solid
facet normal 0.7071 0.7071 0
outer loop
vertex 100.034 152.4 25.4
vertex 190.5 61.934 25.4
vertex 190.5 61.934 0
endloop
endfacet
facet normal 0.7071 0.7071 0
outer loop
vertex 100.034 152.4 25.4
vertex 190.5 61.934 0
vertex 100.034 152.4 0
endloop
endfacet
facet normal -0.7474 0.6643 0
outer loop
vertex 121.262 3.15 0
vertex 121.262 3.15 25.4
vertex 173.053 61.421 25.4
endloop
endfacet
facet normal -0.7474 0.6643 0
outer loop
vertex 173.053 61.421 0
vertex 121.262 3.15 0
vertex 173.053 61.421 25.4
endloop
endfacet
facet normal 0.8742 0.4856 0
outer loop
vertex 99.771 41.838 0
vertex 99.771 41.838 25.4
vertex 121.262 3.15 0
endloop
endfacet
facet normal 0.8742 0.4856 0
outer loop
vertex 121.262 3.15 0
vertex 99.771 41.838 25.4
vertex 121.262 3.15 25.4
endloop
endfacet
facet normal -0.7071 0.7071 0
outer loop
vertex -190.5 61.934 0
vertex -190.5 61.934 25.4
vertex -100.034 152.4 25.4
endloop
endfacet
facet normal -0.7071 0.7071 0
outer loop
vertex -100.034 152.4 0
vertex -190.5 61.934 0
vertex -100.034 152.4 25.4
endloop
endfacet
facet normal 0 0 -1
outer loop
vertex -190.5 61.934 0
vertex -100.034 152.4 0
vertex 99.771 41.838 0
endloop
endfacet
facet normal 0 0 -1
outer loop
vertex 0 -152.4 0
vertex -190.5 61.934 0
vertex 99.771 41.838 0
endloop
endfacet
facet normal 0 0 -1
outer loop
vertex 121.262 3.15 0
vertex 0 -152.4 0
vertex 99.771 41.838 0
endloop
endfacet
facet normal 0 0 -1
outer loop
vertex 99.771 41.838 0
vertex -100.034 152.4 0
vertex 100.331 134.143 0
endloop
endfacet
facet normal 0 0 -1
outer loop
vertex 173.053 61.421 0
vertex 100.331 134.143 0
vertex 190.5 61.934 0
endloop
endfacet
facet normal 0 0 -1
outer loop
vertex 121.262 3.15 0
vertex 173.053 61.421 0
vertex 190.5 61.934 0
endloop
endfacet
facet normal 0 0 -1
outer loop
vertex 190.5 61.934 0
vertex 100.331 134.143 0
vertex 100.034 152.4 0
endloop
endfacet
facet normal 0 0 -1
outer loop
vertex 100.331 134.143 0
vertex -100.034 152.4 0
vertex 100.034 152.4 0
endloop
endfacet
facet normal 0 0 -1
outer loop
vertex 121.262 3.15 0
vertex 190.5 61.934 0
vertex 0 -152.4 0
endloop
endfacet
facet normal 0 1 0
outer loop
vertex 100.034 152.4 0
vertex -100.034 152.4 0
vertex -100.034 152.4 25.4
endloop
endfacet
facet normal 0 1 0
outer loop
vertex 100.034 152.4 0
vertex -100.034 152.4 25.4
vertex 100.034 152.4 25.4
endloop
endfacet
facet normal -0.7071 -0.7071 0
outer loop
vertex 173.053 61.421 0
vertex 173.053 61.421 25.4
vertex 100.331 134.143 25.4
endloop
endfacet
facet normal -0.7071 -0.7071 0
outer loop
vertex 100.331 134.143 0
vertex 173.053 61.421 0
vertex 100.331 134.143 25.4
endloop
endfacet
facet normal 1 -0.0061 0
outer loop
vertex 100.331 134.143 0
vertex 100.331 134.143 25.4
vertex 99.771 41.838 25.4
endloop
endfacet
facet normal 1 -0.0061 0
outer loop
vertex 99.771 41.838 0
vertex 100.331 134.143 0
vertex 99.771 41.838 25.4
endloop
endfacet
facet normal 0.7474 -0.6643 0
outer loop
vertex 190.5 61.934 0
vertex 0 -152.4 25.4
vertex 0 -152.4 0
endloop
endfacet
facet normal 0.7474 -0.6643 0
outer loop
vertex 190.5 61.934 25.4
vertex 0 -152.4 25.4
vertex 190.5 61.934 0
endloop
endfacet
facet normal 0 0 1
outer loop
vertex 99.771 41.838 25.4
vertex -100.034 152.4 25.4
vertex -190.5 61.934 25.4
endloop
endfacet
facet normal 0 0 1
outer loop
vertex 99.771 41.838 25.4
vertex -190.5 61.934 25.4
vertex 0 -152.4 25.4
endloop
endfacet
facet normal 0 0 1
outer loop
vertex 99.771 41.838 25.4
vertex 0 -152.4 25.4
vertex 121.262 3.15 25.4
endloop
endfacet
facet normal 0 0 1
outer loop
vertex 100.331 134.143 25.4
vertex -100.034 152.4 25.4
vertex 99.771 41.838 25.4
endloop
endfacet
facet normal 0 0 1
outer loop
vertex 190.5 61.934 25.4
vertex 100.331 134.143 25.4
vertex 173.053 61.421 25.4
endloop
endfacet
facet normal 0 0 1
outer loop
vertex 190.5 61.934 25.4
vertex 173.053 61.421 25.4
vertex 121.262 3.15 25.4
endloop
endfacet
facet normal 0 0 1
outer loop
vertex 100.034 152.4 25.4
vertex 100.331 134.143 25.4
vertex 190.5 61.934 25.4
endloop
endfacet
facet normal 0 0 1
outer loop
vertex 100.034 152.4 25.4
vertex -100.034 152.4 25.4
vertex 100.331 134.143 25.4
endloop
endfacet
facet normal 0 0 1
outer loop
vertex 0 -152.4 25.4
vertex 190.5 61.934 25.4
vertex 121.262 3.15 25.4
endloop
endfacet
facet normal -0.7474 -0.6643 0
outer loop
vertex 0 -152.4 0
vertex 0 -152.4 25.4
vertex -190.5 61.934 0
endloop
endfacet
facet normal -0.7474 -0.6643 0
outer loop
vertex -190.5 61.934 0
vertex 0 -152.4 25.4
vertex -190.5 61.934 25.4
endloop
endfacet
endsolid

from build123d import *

# Parameters (mm, degrees)
F0_W     = 381
F0_H     = 304.8
F1_DEPTH = 25.4
F3_DEPTH = 25.4
F6_DEPTH = 25.401


with BuildPart() as f1:
    # F0 (on Top) → F1 (new body)
    with BuildSketch(Plane.XY):
        Rectangle(F0_W, F0_H)
    extrude(amount=F1_DEPTH)

    # F2 (on face) → F3 (cut)
    with BuildSketch(Plane.XY.offset(25.4)):
        Polygon((-190.5, 152.4), (-190.5, 61.934096), (-100.034096, 152.4), align=None)
        Polygon((0, -152.4), (-190.5, 61.934096), (-190.5, -152.4), align=None)
    extrude(amount=-F3_DEPTH, mode=Mode.SUBTRACT)

    # F4: F1 across plane


with BuildPart() as f1_1:
    add(f1.part)
    add(f1.part.mirror(Plane.YZ), mode=Mode.INTERSECT)

    # F5 (on face) → F6 (cut, through all)
    with BuildSketch(Plane.XY.offset(25.4)):
        Polygon((173.052639, 61.420945), (100.330883, 134.142701), (99.771466, 41.838474), (121.261792, 3.15037), align=None)
    extrude(amount=-F6_DEPTH, mode=Mode.SUBTRACT)


solid = f1_1.part
